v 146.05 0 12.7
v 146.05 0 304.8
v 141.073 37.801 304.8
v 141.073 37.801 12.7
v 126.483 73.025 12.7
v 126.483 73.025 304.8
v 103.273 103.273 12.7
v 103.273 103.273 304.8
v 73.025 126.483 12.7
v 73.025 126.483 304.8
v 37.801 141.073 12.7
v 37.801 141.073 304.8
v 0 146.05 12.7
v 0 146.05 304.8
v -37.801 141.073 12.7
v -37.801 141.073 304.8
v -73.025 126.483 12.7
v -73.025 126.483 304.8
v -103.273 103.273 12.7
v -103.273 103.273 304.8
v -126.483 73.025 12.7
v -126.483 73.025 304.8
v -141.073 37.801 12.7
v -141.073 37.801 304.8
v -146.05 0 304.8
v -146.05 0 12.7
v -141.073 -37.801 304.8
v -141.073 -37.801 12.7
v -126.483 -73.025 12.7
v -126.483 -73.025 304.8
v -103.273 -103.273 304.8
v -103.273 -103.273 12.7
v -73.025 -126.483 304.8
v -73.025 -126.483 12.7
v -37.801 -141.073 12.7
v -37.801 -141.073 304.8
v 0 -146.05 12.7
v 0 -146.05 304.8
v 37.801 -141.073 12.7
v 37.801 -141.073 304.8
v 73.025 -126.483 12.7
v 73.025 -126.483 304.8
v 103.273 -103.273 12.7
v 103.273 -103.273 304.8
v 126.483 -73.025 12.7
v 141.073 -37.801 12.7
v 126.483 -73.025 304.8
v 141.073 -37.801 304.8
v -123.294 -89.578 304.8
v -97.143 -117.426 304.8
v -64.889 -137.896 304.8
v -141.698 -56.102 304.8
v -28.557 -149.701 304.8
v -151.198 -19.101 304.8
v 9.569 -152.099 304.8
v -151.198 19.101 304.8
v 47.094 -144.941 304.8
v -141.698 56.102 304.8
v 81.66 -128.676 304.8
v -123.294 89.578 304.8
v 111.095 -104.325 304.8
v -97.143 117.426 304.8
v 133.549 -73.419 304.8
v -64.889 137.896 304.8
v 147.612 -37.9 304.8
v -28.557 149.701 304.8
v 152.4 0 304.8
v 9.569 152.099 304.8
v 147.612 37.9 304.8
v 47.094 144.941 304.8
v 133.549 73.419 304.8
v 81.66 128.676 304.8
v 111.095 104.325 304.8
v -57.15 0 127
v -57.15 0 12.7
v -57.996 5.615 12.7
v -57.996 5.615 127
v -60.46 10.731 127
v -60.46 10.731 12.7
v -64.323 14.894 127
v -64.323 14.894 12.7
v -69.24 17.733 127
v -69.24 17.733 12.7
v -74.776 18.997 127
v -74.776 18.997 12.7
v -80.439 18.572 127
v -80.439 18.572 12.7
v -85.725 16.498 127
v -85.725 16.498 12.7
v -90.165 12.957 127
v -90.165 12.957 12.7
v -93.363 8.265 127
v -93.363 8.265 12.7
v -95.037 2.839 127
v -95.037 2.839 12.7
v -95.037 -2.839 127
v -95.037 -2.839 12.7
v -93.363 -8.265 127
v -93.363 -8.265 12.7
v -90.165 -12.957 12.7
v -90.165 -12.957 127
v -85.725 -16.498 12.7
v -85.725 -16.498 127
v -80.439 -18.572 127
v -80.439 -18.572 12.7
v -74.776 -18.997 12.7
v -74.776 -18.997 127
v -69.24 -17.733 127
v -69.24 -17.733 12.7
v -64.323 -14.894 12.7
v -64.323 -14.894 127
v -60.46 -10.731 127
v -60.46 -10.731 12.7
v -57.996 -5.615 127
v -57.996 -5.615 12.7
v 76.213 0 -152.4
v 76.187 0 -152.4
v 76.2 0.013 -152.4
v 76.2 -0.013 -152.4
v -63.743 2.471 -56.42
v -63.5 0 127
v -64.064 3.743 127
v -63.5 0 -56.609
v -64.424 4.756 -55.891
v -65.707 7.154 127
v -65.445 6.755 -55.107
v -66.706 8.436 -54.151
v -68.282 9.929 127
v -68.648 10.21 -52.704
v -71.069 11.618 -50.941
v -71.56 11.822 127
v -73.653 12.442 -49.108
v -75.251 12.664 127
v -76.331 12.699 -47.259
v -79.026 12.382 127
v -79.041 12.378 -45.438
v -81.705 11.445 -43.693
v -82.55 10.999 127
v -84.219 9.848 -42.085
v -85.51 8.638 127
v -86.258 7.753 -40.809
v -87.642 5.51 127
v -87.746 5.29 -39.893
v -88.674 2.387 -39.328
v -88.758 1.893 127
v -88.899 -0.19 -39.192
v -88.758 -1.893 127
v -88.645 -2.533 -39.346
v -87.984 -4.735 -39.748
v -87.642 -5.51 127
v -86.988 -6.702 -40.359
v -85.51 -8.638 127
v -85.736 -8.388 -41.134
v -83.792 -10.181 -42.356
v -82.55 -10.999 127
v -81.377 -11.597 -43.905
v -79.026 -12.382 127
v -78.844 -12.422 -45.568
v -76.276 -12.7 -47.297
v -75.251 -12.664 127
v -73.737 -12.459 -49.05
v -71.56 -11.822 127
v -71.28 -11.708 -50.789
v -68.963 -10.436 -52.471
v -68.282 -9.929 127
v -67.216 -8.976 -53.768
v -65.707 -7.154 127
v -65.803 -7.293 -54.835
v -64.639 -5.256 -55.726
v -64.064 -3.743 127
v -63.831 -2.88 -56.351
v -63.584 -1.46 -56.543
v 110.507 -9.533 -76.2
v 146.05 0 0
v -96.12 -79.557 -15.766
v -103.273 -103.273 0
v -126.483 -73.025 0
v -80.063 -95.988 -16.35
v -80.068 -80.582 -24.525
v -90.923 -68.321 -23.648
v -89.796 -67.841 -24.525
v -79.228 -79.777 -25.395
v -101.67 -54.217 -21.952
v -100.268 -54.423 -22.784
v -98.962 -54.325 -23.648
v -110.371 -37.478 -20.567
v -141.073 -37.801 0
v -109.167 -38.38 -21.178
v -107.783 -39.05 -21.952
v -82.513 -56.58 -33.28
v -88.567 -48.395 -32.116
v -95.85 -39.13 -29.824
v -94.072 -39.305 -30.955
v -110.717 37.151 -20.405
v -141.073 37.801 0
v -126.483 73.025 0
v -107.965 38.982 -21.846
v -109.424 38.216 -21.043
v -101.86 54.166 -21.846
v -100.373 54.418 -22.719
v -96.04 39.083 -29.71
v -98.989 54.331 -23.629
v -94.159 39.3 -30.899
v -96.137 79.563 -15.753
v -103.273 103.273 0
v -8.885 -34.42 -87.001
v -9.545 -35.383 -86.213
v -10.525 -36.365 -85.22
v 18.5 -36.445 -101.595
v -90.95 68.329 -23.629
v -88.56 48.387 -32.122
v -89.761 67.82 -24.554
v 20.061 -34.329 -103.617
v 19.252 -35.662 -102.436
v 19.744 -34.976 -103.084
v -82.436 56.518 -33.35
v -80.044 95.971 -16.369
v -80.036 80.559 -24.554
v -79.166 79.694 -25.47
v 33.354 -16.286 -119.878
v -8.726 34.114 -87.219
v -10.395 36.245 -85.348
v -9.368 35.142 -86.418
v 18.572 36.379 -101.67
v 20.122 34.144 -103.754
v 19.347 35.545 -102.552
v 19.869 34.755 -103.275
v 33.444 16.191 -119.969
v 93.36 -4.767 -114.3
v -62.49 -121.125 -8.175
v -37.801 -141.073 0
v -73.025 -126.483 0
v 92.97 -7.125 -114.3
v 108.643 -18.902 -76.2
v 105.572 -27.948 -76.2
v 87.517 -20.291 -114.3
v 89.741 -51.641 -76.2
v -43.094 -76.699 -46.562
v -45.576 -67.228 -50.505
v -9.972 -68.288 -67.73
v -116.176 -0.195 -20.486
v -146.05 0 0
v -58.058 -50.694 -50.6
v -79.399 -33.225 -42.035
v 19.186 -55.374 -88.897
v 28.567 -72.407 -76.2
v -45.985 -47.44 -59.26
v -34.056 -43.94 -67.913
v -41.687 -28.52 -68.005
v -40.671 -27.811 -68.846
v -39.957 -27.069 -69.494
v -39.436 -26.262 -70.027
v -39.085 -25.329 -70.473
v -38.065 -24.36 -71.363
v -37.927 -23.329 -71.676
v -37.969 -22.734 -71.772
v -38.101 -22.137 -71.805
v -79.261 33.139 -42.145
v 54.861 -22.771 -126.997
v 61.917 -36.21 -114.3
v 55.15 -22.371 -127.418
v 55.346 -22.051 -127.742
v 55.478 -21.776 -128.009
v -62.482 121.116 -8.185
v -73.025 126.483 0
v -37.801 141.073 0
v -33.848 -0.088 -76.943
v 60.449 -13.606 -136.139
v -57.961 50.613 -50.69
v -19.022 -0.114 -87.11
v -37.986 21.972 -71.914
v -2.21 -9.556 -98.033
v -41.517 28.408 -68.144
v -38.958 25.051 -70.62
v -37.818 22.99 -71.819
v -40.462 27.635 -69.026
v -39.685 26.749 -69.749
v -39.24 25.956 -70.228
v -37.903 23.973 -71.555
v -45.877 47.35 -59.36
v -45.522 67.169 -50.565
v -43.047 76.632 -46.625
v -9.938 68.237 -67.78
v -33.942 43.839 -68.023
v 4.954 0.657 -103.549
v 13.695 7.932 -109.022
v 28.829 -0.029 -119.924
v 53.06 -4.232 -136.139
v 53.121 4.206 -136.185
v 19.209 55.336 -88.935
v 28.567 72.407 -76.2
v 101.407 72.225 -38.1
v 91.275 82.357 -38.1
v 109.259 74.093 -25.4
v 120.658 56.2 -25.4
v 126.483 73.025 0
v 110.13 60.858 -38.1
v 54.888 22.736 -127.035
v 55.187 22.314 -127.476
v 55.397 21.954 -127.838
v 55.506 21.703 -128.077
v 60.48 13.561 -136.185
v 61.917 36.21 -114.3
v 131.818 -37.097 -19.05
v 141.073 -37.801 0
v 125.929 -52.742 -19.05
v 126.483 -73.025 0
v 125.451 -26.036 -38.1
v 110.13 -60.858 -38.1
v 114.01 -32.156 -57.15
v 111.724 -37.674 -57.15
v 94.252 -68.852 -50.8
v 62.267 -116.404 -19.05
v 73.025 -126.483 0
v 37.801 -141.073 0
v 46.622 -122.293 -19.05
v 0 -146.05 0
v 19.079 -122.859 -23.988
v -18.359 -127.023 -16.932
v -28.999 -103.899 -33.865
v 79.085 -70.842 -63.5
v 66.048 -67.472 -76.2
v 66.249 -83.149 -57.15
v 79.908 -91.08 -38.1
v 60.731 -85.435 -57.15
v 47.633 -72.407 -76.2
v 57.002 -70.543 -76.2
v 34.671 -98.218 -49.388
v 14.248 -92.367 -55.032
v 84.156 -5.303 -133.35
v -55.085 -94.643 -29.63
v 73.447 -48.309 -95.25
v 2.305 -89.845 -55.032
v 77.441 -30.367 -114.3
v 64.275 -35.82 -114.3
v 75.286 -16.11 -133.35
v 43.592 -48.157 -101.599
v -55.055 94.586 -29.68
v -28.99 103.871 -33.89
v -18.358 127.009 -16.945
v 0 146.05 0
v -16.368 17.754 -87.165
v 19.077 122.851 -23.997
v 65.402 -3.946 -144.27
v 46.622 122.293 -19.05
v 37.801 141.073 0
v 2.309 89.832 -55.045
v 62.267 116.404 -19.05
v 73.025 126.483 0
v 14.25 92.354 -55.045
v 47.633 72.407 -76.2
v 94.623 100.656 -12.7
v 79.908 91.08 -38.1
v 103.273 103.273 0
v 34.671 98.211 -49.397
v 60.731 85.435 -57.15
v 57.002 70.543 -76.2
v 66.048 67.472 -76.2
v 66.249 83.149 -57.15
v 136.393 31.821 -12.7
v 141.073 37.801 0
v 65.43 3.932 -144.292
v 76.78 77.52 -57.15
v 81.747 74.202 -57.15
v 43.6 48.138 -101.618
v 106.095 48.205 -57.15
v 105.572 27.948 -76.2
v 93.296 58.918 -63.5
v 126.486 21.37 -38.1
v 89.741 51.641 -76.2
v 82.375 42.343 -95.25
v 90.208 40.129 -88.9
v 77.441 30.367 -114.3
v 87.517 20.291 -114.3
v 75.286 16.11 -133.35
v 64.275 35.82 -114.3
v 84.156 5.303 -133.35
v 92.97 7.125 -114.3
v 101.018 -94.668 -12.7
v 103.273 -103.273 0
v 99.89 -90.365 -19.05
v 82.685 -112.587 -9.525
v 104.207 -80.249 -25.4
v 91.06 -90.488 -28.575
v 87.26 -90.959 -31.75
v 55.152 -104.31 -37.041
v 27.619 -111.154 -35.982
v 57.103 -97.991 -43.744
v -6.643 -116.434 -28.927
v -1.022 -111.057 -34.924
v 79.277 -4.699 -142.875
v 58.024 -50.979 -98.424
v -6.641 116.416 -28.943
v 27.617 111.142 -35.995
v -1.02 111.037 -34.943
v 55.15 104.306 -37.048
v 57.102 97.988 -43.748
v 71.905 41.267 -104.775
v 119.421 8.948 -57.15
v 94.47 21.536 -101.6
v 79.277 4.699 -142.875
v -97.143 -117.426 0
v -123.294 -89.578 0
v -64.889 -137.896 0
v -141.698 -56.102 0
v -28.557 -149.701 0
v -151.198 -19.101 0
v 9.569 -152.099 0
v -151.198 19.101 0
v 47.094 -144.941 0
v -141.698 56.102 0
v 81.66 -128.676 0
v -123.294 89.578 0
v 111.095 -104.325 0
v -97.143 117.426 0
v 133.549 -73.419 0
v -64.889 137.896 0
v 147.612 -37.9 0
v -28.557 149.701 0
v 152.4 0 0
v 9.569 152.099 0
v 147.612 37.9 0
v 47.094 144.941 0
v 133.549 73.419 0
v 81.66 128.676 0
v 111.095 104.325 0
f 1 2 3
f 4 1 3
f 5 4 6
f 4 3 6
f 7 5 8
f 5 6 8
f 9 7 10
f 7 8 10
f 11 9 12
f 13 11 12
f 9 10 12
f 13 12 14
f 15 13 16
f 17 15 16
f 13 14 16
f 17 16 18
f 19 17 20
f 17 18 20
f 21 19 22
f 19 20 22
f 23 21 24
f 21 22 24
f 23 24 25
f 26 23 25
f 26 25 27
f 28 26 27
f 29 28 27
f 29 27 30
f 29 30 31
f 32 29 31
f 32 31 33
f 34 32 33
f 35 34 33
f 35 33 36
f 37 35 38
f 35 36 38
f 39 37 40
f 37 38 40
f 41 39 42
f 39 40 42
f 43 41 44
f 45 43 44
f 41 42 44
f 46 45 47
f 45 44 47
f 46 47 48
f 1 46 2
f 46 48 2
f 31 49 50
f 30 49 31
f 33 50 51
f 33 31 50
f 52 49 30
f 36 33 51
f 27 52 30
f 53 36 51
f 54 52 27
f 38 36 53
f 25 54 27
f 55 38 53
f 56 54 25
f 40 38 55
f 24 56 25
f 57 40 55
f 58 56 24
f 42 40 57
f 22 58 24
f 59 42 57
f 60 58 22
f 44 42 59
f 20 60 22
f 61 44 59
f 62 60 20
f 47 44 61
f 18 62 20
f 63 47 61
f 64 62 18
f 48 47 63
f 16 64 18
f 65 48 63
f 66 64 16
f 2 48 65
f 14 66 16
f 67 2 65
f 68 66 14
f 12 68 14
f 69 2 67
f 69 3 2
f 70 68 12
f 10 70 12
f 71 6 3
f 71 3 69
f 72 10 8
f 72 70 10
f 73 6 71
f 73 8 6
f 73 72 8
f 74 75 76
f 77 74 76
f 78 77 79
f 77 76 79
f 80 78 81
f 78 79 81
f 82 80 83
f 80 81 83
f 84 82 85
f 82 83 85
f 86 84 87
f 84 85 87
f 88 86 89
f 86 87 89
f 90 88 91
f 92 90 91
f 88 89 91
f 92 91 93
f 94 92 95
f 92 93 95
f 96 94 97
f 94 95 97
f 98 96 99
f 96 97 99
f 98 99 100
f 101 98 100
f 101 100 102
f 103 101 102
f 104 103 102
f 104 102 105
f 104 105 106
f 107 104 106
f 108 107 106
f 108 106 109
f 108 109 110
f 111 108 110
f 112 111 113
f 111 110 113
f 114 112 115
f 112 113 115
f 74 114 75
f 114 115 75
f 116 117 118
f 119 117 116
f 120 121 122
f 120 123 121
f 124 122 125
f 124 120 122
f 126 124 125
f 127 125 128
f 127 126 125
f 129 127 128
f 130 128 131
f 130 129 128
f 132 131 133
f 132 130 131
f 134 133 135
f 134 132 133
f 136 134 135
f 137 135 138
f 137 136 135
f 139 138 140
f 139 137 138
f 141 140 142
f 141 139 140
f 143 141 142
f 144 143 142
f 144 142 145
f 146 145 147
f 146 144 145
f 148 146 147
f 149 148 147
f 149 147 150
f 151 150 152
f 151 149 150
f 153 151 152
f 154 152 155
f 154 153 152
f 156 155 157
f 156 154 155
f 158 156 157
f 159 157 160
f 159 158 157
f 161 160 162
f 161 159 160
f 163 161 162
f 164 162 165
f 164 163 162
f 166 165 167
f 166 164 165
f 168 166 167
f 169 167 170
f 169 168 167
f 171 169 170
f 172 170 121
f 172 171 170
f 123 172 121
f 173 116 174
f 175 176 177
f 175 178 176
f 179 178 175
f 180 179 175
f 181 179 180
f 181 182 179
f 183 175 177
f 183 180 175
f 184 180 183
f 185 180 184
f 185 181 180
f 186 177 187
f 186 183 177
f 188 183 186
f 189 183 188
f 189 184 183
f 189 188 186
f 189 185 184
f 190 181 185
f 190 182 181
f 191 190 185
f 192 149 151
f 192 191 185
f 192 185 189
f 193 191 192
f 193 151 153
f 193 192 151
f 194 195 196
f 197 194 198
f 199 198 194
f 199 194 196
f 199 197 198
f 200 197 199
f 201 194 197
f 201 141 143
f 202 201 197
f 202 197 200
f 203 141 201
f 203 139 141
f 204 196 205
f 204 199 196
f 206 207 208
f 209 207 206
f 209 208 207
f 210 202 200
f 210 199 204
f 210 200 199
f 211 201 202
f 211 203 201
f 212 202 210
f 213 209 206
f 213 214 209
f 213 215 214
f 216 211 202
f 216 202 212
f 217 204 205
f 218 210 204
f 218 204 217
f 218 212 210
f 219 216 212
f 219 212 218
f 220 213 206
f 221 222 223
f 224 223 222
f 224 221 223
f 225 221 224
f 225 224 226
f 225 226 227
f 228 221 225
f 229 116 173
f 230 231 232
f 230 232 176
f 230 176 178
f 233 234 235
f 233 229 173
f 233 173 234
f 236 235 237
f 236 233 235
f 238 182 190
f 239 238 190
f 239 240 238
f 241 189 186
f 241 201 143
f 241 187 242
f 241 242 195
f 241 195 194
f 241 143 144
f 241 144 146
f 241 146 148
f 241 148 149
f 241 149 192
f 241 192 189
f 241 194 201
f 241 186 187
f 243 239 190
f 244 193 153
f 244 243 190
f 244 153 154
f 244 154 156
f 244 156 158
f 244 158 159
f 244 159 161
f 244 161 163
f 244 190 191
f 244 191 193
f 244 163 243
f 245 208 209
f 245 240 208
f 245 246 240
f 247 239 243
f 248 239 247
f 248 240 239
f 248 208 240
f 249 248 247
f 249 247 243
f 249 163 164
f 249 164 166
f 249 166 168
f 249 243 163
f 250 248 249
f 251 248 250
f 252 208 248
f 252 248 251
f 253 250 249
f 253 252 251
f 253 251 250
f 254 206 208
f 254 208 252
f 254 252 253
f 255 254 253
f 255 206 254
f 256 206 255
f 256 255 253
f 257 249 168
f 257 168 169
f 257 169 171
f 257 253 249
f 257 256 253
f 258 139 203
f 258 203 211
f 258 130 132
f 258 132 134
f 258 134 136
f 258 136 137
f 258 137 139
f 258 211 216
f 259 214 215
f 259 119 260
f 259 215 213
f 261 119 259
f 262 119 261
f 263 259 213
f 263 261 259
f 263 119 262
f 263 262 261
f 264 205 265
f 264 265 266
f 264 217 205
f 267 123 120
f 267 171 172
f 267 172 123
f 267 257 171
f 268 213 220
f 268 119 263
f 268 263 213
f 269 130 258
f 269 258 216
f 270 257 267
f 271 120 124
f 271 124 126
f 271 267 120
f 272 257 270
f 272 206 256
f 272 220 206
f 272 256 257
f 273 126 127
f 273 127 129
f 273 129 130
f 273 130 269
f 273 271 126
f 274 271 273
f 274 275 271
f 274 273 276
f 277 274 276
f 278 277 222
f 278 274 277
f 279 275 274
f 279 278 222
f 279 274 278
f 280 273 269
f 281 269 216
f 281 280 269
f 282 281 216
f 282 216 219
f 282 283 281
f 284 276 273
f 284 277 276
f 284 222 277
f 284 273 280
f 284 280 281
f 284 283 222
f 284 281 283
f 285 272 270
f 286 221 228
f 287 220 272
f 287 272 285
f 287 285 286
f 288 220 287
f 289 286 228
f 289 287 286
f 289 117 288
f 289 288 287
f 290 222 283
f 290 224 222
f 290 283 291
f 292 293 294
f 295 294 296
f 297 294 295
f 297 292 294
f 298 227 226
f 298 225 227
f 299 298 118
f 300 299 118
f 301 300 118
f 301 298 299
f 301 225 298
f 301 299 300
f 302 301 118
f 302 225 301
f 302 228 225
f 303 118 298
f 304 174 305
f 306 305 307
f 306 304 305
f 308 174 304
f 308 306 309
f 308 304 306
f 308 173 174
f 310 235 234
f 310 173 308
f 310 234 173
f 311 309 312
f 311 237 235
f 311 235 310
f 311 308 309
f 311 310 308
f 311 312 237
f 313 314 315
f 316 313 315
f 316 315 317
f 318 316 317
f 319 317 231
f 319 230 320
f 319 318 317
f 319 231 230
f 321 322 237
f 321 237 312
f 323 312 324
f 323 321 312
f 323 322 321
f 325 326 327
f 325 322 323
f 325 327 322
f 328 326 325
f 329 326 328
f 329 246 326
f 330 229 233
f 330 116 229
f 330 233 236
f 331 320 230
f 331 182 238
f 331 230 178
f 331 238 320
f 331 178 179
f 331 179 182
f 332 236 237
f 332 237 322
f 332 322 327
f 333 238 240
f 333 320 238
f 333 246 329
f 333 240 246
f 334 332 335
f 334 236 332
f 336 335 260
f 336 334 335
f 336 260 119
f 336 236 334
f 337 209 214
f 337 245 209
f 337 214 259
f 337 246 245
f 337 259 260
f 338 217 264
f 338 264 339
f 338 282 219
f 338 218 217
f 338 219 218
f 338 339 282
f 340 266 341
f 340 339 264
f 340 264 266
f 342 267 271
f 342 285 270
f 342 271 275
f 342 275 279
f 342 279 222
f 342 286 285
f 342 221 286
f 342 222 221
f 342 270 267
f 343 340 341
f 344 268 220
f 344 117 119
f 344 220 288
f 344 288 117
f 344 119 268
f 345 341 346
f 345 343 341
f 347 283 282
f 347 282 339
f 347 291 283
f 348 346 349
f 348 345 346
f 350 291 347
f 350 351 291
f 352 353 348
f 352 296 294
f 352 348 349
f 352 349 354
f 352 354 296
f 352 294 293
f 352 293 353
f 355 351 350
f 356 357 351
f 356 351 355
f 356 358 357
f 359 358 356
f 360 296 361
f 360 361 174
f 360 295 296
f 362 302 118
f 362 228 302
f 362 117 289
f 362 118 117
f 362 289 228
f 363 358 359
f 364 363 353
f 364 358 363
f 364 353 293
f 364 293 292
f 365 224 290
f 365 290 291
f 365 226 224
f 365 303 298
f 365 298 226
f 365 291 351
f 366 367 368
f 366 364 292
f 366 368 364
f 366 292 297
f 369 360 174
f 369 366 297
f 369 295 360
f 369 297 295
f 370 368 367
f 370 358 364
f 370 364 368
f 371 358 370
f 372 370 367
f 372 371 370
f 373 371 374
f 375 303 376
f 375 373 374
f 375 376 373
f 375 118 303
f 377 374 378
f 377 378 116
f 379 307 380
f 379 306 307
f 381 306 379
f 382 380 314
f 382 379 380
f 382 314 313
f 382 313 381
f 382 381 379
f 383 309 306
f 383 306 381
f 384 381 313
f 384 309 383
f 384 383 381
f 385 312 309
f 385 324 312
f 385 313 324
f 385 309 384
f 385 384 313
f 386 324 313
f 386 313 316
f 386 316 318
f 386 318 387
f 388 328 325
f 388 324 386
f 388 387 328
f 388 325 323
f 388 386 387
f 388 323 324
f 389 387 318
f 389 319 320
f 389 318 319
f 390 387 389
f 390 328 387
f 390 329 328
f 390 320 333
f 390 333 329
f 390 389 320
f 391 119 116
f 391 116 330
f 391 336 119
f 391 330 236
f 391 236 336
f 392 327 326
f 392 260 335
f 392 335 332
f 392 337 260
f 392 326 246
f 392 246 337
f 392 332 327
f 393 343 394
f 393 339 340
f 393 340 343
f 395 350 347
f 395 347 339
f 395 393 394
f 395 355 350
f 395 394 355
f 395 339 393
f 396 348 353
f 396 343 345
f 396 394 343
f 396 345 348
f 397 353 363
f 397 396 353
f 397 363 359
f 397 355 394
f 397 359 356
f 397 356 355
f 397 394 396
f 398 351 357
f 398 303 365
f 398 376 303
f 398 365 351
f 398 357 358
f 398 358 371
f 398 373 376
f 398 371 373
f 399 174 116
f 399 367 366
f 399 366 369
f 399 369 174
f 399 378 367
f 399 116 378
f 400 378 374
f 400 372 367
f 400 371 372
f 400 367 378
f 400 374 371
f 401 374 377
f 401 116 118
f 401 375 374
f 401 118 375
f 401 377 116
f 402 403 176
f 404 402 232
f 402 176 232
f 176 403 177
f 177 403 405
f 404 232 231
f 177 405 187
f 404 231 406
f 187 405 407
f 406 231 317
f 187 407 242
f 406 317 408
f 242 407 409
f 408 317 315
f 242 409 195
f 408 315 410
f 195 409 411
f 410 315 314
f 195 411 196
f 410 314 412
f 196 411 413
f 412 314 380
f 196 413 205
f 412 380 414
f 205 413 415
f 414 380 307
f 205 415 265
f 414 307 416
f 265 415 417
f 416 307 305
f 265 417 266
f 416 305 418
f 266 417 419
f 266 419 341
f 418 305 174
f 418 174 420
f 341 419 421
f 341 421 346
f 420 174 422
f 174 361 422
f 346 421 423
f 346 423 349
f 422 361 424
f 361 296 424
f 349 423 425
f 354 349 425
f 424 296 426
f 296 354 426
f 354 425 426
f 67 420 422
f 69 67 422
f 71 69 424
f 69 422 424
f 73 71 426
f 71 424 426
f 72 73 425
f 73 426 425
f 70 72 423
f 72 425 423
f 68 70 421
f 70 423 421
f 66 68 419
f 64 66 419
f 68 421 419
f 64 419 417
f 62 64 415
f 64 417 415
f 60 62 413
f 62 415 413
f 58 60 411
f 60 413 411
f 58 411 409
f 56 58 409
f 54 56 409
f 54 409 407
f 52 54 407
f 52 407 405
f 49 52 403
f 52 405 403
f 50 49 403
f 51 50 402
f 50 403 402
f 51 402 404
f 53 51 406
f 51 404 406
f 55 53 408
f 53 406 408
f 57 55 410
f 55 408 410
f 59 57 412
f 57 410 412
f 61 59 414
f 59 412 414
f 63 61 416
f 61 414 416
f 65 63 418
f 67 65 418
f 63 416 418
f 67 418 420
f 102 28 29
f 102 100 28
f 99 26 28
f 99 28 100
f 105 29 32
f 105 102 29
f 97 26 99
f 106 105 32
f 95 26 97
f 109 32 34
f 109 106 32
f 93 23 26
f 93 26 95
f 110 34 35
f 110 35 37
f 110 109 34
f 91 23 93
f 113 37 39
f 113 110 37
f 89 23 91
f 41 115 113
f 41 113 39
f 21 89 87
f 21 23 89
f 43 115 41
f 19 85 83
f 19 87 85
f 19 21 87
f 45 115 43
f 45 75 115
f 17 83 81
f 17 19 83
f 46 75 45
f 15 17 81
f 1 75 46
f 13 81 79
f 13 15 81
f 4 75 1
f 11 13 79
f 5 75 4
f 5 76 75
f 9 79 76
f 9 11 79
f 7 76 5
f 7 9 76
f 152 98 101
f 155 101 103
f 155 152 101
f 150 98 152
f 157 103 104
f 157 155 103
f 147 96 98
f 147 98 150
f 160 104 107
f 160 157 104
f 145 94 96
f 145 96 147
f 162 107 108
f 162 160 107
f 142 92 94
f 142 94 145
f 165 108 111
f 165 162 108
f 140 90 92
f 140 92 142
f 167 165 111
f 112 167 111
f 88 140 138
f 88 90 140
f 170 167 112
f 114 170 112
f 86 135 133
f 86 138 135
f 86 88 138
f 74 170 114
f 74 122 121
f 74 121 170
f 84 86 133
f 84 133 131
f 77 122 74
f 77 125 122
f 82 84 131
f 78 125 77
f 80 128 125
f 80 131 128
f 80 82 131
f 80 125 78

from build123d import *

# Parameters (mm, degrees)
F0_R       = 152.4
F1_DEPTH   = 304.8
F2_R       = 146.05
F3_DEPTH   = 292.1
F4_R       = 0.0127
F5_DEPTH   = 177.8
F6_R       = 0.0127
F7_DEPTH   = 152.4
F8_R       = 146.05
F7_FACE1_R = 0.0127
F10_R      = 0.0127
F11_DEPTH  = 25.4
F12_R      = 12.7
F13_DEPTH  = 165.1
F14_R      = 19.05
F14_R_2    = 12.7
F15_DEPTH  = 114.3


with BuildPart() as f1:
    # F0 (on Top) → F1 (new body)
    with BuildSketch(Plane.XY):
        Circle(F0_R)
    extrude(amount=F1_DEPTH)

    # F2 (on face) → F3 (cut)
    with BuildSketch(Plane.XY.offset(304.8)):
        Circle(F2_R)
    extrude(amount=-F3_DEPTH, mode=Mode.SUBTRACT)

    # F4 (on face) → F5 (join)
    with BuildSketch(Plane(origin=(0, 0, 0), x_dir=(1, 0, 0), z_dir=(0, 0, -1))):
        with Locations((76.2, 0)):
            Circle(F4_R)
    extrude(amount=F5_DEPTH)

    # F6 (on face) → F7 (cut)
    with BuildSketch(Plane(origin=(0, 0, 0), x_dir=(1, 0, 0), z_dir=(0, 0, -1))):
        with Locations((76.2, 0)):
            Circle(F6_R)
    extrude(amount=F7_DEPTH, mode=Mode.SUBTRACT)

    # F8 (on face) → F9 section 0
    with BuildSketch(Plane(origin=(0, 0, 0), x_dir=(1, 0, 0), z_dir=(0, 0, -1))):
        Circle(F8_R)
    # F7_face1 (on face) → F9 section 1
    with BuildSketch(Plane(origin=(76.2, 0, -152.4), x_dir=(1, 0, 0), z_dir=(0, 0, 1))):
        Circle(F7_FACE1_R)
    loft()

    # F10 (on face) → F11 (cut)
    with BuildSketch(Plane(origin=(0, 0, -177.8), x_dir=(1, 0, 0), z_dir=(0, 0, -1))):
        with Locations((76.2, 0)):
            Circle(F10_R)
    extrude(amount=-F11_DEPTH, mode=Mode.SUBTRACT)

    # F12 (on face) → F13 (cut)
    with BuildSketch(Plane.XY.offset(12.7)):
        with Locations((-76.2, 0)):
            Circle(F12_R)
    extrude(amount=-F13_DEPTH, mode=Mode.SUBTRACT)

    # F14 (on face) → F15 (join)
    with BuildSketch(Plane.XY.offset(12.7)):
        with Locations((-76.2, 0)):
            Circle(F14_R)
        with Locations((-76.2, 0)):
            Circle(F14_R_2, mode=Mode.SUBTRACT)
    extrude(amount=F15_DEPTH)


solid = f1.part
